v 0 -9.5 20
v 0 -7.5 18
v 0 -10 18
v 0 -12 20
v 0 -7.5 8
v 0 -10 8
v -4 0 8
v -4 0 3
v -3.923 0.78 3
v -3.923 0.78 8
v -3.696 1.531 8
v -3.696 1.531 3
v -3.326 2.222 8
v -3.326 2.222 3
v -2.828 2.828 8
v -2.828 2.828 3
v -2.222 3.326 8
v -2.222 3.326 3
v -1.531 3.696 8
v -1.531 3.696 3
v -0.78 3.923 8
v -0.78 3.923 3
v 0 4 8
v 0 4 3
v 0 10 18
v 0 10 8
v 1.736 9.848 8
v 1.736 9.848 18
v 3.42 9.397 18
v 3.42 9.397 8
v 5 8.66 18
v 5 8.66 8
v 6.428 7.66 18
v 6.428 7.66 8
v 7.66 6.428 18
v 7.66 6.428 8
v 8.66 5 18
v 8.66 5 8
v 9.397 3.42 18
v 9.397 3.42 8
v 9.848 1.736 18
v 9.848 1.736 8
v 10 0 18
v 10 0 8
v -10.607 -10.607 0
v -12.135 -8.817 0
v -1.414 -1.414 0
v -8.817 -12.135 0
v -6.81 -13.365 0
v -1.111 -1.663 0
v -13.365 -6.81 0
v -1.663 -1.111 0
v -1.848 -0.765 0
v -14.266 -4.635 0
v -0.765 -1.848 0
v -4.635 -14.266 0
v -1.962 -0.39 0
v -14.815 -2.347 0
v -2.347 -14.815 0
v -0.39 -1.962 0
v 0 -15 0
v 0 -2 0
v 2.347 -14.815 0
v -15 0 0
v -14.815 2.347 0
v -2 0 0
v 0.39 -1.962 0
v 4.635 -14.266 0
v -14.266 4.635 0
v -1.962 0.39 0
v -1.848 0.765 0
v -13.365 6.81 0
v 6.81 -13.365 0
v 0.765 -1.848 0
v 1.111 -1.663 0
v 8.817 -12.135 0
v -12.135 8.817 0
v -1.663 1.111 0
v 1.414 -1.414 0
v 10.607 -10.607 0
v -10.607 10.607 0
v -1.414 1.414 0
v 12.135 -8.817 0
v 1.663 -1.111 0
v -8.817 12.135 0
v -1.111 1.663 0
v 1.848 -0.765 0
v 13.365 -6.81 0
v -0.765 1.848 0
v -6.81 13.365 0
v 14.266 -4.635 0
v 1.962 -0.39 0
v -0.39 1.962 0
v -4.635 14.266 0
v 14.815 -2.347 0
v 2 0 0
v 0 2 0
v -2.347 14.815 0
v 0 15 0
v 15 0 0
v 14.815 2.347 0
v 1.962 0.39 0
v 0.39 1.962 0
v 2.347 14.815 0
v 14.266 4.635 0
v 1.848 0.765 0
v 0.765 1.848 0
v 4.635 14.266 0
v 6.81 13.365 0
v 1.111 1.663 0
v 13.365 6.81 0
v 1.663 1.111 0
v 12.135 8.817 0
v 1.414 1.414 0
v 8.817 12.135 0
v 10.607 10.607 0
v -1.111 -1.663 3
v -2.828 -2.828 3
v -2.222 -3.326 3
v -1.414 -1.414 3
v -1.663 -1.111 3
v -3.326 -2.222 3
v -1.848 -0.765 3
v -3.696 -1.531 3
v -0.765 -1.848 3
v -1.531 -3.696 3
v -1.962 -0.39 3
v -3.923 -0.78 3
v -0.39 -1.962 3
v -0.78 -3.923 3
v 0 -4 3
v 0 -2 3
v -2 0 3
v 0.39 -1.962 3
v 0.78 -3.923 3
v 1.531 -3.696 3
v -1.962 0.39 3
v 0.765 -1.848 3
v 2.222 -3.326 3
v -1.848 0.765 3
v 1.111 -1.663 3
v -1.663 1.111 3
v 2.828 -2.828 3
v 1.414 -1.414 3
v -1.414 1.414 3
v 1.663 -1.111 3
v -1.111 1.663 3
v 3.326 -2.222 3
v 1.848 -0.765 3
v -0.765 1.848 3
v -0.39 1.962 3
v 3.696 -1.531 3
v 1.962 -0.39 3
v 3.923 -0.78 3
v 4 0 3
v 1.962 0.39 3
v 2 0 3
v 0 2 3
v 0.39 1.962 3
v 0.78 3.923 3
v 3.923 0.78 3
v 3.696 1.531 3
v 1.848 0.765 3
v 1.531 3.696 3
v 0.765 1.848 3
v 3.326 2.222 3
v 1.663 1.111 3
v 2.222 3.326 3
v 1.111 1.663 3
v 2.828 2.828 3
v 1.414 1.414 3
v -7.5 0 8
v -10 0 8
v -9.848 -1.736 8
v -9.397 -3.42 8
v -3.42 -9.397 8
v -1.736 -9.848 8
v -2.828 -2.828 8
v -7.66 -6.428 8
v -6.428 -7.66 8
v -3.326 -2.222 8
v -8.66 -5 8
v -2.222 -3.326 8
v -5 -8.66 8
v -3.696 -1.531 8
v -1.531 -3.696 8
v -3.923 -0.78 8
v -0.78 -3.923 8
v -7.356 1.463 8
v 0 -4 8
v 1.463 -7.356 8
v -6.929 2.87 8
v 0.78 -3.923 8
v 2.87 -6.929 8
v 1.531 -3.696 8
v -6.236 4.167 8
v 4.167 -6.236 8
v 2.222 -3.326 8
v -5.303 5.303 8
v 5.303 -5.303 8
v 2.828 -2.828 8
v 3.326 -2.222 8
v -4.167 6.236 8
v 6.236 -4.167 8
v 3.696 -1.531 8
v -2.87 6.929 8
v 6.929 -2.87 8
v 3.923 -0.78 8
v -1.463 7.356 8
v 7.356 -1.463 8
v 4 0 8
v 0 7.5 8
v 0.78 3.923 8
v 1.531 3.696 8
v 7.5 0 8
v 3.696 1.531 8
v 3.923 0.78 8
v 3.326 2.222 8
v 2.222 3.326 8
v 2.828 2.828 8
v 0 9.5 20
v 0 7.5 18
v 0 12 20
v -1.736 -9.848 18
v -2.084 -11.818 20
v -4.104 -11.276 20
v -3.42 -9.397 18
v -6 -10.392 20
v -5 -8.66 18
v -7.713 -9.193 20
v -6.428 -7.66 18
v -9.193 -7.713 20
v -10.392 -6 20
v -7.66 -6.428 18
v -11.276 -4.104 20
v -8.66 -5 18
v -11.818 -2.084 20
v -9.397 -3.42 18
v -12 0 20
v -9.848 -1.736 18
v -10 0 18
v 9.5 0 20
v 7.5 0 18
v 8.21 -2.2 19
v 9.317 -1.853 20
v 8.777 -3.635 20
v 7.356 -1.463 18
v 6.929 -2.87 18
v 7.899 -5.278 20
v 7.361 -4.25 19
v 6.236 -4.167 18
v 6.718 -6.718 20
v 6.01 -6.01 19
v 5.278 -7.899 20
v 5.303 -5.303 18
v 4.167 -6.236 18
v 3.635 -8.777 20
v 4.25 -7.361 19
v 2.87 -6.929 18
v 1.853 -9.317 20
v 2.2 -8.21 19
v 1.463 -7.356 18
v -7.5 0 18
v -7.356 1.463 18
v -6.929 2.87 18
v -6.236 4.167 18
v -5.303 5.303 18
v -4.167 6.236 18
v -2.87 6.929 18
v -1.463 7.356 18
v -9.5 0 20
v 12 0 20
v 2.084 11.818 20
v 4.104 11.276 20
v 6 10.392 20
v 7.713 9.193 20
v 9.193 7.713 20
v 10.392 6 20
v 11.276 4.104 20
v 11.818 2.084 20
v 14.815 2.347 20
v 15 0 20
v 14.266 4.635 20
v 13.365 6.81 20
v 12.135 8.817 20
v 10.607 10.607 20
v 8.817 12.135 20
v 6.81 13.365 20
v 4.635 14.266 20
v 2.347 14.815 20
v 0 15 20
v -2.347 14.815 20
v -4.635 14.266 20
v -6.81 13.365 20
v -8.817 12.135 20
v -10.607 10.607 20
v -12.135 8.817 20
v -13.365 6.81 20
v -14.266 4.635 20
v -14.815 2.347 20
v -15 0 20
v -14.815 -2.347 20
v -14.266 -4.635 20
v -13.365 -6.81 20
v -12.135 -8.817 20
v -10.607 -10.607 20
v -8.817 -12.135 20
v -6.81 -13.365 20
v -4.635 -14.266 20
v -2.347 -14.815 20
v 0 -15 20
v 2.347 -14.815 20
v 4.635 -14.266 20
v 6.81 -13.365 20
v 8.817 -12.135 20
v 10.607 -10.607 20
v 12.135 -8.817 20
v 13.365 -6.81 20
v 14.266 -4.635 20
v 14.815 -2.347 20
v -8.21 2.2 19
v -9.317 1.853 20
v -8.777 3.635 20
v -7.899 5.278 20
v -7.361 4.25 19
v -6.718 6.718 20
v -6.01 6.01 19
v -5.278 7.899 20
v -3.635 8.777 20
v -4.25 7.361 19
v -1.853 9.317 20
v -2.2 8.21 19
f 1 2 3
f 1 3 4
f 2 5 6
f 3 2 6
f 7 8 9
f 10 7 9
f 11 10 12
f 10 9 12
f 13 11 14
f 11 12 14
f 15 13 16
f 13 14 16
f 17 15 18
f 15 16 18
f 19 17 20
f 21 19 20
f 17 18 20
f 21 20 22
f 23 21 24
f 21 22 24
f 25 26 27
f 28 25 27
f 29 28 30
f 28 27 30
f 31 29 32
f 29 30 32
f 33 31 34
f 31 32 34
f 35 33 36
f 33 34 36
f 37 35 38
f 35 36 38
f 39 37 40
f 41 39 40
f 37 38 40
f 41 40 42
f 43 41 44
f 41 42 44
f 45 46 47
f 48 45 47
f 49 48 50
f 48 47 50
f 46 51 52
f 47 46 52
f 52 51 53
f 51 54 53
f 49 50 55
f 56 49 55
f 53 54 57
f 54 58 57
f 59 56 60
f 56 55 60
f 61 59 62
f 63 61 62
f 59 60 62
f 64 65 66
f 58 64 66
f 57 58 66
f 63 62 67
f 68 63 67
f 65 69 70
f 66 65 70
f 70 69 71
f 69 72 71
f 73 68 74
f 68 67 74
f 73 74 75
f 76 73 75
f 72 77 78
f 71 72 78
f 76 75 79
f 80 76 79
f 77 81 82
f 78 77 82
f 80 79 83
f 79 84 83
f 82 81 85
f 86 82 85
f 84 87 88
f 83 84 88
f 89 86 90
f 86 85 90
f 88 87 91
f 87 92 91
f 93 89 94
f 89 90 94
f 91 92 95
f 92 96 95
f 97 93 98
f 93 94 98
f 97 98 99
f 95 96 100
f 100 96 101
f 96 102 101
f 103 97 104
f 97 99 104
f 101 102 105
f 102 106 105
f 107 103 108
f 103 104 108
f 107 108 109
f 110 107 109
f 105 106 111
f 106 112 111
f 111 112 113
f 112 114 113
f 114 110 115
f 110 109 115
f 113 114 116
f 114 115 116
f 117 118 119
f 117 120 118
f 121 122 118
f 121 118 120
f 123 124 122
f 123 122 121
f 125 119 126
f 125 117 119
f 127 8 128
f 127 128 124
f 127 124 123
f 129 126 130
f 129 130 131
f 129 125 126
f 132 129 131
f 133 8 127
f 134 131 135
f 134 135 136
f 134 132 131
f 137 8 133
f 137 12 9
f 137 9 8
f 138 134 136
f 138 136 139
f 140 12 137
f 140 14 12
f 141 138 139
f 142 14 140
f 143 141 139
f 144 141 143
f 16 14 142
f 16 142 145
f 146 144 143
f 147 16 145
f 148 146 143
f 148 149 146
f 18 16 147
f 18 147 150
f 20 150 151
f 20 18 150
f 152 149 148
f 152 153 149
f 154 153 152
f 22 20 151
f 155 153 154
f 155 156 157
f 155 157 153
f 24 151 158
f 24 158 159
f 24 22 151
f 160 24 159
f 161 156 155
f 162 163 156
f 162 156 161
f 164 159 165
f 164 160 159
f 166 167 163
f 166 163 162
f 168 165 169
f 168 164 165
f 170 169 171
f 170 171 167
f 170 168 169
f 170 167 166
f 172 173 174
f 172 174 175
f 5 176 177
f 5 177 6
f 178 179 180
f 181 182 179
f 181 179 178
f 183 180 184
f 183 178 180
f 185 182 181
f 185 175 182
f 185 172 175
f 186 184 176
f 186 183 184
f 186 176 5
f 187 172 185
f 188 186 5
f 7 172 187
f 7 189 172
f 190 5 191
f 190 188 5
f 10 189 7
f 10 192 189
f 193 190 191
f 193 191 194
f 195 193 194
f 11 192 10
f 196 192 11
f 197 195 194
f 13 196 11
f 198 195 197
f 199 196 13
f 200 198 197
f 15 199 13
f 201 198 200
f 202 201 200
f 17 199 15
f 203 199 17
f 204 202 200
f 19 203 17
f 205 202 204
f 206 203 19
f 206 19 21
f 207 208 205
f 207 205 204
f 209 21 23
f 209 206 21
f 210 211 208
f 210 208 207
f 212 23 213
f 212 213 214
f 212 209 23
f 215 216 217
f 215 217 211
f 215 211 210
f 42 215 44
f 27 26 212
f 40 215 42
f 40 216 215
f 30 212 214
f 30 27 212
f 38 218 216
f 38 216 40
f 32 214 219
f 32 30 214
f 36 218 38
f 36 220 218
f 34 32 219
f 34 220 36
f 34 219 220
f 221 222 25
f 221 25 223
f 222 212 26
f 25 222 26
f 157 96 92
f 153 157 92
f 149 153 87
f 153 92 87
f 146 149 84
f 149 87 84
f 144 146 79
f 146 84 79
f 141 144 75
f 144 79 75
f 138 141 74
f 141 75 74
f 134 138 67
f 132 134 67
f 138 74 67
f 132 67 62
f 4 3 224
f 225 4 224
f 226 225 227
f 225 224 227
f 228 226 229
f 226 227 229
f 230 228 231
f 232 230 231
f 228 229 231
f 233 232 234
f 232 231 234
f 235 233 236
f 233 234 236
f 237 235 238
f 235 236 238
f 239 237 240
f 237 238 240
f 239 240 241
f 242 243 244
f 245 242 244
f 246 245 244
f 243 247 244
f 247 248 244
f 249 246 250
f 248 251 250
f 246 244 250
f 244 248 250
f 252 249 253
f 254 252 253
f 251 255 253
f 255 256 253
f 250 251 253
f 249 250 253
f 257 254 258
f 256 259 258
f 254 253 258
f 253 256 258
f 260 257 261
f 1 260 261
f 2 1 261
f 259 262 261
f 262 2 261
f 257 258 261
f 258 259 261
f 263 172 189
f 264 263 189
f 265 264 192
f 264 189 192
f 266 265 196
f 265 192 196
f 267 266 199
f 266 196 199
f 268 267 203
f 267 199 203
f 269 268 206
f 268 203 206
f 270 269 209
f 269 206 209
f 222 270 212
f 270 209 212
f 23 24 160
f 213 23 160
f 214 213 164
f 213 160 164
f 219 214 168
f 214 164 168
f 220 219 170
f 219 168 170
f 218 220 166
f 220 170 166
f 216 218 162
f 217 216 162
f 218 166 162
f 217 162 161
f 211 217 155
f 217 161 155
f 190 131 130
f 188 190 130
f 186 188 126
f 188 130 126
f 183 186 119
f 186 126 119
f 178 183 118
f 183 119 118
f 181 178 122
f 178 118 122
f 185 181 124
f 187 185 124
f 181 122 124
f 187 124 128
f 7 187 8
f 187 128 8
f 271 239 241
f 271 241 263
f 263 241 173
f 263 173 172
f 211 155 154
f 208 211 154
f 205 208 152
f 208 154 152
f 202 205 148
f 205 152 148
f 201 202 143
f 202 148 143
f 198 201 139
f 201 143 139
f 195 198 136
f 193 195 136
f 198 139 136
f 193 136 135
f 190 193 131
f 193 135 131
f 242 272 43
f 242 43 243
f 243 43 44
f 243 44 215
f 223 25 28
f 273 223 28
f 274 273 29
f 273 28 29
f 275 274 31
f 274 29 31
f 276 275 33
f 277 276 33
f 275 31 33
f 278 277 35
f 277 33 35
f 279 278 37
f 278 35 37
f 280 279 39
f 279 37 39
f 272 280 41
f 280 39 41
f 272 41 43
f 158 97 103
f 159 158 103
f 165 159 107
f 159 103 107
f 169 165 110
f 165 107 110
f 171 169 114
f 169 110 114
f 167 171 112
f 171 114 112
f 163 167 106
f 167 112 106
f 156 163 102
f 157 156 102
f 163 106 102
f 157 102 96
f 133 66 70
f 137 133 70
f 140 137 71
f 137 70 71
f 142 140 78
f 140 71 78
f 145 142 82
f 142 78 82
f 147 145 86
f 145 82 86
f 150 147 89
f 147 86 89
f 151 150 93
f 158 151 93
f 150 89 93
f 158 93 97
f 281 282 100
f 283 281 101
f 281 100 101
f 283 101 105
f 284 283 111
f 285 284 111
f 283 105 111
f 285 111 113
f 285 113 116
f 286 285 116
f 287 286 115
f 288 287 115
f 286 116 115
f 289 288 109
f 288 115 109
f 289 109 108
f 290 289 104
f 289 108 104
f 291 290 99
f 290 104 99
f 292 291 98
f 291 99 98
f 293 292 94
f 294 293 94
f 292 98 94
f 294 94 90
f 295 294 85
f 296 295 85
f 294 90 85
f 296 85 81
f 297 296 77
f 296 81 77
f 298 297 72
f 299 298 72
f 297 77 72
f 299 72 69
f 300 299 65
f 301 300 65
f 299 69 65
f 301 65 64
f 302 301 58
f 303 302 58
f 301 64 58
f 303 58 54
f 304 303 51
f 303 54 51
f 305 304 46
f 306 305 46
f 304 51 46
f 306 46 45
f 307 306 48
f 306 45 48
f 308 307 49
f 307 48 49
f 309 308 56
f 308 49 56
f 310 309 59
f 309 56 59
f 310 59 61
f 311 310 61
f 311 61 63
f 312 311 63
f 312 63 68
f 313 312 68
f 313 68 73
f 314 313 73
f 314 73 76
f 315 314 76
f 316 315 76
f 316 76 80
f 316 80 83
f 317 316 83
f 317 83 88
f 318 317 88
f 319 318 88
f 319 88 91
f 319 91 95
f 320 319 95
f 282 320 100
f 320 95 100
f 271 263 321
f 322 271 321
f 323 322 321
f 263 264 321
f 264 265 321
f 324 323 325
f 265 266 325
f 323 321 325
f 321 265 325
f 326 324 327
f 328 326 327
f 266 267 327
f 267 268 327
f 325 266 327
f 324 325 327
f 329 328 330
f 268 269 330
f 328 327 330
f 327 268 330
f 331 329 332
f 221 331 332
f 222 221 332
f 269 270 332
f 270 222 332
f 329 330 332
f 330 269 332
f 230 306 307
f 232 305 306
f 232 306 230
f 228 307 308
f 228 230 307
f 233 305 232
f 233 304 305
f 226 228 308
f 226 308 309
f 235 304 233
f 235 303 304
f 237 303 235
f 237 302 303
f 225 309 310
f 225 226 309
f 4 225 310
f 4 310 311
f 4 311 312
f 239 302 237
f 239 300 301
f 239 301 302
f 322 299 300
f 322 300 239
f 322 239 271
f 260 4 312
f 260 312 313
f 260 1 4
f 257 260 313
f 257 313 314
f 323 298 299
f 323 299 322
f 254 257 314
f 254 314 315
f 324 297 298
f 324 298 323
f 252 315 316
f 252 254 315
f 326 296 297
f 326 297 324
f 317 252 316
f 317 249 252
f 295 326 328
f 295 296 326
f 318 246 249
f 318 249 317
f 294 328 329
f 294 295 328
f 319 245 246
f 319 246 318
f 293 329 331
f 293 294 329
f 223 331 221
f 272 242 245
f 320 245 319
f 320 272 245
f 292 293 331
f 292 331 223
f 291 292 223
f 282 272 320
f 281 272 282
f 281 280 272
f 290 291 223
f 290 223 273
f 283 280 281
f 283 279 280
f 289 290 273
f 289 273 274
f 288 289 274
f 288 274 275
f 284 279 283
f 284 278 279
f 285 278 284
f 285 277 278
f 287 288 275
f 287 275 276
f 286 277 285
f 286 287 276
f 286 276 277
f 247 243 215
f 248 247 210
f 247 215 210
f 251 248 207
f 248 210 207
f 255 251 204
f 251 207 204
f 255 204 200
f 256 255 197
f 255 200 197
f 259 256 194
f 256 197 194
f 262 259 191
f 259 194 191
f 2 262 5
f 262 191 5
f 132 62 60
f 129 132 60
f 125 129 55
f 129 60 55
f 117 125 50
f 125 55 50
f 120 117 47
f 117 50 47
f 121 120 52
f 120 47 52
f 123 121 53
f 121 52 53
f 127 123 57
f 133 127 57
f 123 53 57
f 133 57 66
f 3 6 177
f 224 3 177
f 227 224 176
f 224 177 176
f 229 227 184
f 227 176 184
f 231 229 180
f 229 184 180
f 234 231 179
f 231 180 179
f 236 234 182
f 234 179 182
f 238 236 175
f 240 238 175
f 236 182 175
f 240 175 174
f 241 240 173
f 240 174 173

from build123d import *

# Parameters (mm, degrees)
F1_DEPTH = 3
F2_DEPTH = 8
F0_R     = 15
F3_DEPTH = 20
F4_SIZE  = 2


with BuildPart() as f1:
    # F0 (on Top) → F1 (new body)
    with BuildSketch(Plane.XY):
        with BuildLine():
            Line((2, 0), (4, 0))
            ThreePointArc((4, 0), (2.8284271247, 2.8284271247), (0, 4))
            Line((0, 4), (0, 2))
            ThreePointArc((0, 2), (1.4142135624, 1.4142135624), (2, 0))
        make_face()
        with BuildLine():
            Line((0, 2), (0, 4))
            ThreePointArc((0, 4), (-2.8284271247, 2.8284271247), (-4, 0))
            Line((-4, 0), (-2, 0))
            ThreePointArc((-2, 0), (-1.4142135624, 1.4142135624), (0, 2))
        make_face()
        with BuildLine():
            ThreePointArc((-4, 0), (-2.8284271247, -2.8284271247), (0, -4))
            Line((0, -4), (0, -2))
            ThreePointArc((0, -2), (-1.4142135624, -1.4142135624), (-2, 0))
            Line((-2, 0), (-4, 0))
        make_face()
        with BuildLine():
            ThreePointArc((0, -4), (2.8284271247, -2.8284271247), (4, 0))
            Line((4, 0), (2, 0))
            ThreePointArc((2, 0), (1.4142135624, -1.4142135624), (0, -2))
            Line((0, -2), (0, -4))
        make_face()
    extrude(amount=F1_DEPTH)

    # F0 (on Top) → F2 (join)
    with BuildSketch(Plane.XY):
        with BuildLine():
            Line((4, 0), (7.5, 0))
            ThreePointArc((7.5, 0), (5.3033008589, 5.3033008589), (0, 7.5))
            Line((0, 7.5), (0, 4))
            ThreePointArc((0, 4), (2.8284271247, 2.8284271247), (4, 0))
        make_face()
        with BuildLine():
            ThreePointArc((-7.5, 0), (-5.3033008589, -5.3033008589), (0, -7.5))
            Line((0, -7.5), (0, -4))
            ThreePointArc((0, -4), (-2.8284271247, -2.8284271247), (-4, 0))
            Line((-4, 0), (-7.5, 0))
        make_face()
        with BuildLine():
            ThreePointArc((0, -7.5), (5.3033008589, -5.3033008589), (7.5, 0))
            Line((7.5, 0), (4, 0))
            ThreePointArc((4, 0), (2.8284271247, -2.8284271247), (0, -4))
            Line((0, -4), (0, -7.5))
        make_face()
        with BuildLine():
            Line((0, 4), (0, 7.5))
            ThreePointArc((0, 7.5), (-5.3033008589, 5.3033008589), (-7.5, 0))
            Line((-7.5, 0), (-4, 0))
            ThreePointArc((-4, 0), (-2.8284271247, 2.8284271247), (0, 4))
        make_face()
        with BuildLine():
            ThreePointArc((-10, 0), (-7.0710678119, -7.0710678119), (0, -10))
            Line((0, -10), (0, -7.5))
            ThreePointArc((0, -7.5), (-5.3033008589, -5.3033008589), (-7.5, 0))
            Line((-7.5, 0), (-10, 0))
        make_face()
        with BuildLine():
            Line((7.5, 0), (10, 0))
            ThreePointArc((10, 0), (7.0710678119, 7.0710678119), (0, 10))
            Line((0, 10), (0, 7.5))
            ThreePointArc((0, 7.5), (5.3033008589, 5.3033008589), (7.5, 0))
        make_face()
    extrude(amount=F2_DEPTH)

    # F0 (on Top) → F3 (join)
    with BuildSketch(Plane.XY):
        Circle(F0_R)
        with BuildLine():
            ThreePointArc((0, 10), (7.0710678119, 7.0710678119), (10, 0))
            ThreePointArc((10, 0), (7.0710678119, -7.0710678119), (0, -10))
            ThreePointArc((0, -10), (-7.0710678119, -7.0710678119), (-10, 0))
            ThreePointArc((-10, 0), (-7.0710678119, 7.0710678119), (0, 10))
        make_face(mode=Mode.SUBTRACT)
        with BuildLine():
            Line((0, 7.5), (0, 10))
            ThreePointArc((0, 10), (-7.0710678119, 7.0710678119), (-10, 0))
            Line((-10, 0), (-7.5, 0))
            ThreePointArc((-7.5, 0), (-5.3033008589, 5.3033008589), (0, 7.5))
        make_face()
        with BuildLine():
            ThreePointArc((0, -10), (7.0710678119, -7.0710678119), (10, 0))
            Line((10, 0), (7.5, 0))
            ThreePointArc((7.5, 0), (5.3033008589, -5.3033008589), (0, -7.5))
            Line((0, -7.5), (0, -10))
        make_face()
    extrude(amount=F3_DEPTH)

    # F4
    f4_edges = [f1.edges().sort_by_distance(p)[0] for p in [
        (-5.303301, 5.303301, 20),
        (5.303301, -5.303301, 20),
        (7.071068, 7.071068, 20),
        (-7.071068, -7.071068, 20),
    ]]
    chamfer(f4_edges, length=F4_SIZE)


solid = f1.part
